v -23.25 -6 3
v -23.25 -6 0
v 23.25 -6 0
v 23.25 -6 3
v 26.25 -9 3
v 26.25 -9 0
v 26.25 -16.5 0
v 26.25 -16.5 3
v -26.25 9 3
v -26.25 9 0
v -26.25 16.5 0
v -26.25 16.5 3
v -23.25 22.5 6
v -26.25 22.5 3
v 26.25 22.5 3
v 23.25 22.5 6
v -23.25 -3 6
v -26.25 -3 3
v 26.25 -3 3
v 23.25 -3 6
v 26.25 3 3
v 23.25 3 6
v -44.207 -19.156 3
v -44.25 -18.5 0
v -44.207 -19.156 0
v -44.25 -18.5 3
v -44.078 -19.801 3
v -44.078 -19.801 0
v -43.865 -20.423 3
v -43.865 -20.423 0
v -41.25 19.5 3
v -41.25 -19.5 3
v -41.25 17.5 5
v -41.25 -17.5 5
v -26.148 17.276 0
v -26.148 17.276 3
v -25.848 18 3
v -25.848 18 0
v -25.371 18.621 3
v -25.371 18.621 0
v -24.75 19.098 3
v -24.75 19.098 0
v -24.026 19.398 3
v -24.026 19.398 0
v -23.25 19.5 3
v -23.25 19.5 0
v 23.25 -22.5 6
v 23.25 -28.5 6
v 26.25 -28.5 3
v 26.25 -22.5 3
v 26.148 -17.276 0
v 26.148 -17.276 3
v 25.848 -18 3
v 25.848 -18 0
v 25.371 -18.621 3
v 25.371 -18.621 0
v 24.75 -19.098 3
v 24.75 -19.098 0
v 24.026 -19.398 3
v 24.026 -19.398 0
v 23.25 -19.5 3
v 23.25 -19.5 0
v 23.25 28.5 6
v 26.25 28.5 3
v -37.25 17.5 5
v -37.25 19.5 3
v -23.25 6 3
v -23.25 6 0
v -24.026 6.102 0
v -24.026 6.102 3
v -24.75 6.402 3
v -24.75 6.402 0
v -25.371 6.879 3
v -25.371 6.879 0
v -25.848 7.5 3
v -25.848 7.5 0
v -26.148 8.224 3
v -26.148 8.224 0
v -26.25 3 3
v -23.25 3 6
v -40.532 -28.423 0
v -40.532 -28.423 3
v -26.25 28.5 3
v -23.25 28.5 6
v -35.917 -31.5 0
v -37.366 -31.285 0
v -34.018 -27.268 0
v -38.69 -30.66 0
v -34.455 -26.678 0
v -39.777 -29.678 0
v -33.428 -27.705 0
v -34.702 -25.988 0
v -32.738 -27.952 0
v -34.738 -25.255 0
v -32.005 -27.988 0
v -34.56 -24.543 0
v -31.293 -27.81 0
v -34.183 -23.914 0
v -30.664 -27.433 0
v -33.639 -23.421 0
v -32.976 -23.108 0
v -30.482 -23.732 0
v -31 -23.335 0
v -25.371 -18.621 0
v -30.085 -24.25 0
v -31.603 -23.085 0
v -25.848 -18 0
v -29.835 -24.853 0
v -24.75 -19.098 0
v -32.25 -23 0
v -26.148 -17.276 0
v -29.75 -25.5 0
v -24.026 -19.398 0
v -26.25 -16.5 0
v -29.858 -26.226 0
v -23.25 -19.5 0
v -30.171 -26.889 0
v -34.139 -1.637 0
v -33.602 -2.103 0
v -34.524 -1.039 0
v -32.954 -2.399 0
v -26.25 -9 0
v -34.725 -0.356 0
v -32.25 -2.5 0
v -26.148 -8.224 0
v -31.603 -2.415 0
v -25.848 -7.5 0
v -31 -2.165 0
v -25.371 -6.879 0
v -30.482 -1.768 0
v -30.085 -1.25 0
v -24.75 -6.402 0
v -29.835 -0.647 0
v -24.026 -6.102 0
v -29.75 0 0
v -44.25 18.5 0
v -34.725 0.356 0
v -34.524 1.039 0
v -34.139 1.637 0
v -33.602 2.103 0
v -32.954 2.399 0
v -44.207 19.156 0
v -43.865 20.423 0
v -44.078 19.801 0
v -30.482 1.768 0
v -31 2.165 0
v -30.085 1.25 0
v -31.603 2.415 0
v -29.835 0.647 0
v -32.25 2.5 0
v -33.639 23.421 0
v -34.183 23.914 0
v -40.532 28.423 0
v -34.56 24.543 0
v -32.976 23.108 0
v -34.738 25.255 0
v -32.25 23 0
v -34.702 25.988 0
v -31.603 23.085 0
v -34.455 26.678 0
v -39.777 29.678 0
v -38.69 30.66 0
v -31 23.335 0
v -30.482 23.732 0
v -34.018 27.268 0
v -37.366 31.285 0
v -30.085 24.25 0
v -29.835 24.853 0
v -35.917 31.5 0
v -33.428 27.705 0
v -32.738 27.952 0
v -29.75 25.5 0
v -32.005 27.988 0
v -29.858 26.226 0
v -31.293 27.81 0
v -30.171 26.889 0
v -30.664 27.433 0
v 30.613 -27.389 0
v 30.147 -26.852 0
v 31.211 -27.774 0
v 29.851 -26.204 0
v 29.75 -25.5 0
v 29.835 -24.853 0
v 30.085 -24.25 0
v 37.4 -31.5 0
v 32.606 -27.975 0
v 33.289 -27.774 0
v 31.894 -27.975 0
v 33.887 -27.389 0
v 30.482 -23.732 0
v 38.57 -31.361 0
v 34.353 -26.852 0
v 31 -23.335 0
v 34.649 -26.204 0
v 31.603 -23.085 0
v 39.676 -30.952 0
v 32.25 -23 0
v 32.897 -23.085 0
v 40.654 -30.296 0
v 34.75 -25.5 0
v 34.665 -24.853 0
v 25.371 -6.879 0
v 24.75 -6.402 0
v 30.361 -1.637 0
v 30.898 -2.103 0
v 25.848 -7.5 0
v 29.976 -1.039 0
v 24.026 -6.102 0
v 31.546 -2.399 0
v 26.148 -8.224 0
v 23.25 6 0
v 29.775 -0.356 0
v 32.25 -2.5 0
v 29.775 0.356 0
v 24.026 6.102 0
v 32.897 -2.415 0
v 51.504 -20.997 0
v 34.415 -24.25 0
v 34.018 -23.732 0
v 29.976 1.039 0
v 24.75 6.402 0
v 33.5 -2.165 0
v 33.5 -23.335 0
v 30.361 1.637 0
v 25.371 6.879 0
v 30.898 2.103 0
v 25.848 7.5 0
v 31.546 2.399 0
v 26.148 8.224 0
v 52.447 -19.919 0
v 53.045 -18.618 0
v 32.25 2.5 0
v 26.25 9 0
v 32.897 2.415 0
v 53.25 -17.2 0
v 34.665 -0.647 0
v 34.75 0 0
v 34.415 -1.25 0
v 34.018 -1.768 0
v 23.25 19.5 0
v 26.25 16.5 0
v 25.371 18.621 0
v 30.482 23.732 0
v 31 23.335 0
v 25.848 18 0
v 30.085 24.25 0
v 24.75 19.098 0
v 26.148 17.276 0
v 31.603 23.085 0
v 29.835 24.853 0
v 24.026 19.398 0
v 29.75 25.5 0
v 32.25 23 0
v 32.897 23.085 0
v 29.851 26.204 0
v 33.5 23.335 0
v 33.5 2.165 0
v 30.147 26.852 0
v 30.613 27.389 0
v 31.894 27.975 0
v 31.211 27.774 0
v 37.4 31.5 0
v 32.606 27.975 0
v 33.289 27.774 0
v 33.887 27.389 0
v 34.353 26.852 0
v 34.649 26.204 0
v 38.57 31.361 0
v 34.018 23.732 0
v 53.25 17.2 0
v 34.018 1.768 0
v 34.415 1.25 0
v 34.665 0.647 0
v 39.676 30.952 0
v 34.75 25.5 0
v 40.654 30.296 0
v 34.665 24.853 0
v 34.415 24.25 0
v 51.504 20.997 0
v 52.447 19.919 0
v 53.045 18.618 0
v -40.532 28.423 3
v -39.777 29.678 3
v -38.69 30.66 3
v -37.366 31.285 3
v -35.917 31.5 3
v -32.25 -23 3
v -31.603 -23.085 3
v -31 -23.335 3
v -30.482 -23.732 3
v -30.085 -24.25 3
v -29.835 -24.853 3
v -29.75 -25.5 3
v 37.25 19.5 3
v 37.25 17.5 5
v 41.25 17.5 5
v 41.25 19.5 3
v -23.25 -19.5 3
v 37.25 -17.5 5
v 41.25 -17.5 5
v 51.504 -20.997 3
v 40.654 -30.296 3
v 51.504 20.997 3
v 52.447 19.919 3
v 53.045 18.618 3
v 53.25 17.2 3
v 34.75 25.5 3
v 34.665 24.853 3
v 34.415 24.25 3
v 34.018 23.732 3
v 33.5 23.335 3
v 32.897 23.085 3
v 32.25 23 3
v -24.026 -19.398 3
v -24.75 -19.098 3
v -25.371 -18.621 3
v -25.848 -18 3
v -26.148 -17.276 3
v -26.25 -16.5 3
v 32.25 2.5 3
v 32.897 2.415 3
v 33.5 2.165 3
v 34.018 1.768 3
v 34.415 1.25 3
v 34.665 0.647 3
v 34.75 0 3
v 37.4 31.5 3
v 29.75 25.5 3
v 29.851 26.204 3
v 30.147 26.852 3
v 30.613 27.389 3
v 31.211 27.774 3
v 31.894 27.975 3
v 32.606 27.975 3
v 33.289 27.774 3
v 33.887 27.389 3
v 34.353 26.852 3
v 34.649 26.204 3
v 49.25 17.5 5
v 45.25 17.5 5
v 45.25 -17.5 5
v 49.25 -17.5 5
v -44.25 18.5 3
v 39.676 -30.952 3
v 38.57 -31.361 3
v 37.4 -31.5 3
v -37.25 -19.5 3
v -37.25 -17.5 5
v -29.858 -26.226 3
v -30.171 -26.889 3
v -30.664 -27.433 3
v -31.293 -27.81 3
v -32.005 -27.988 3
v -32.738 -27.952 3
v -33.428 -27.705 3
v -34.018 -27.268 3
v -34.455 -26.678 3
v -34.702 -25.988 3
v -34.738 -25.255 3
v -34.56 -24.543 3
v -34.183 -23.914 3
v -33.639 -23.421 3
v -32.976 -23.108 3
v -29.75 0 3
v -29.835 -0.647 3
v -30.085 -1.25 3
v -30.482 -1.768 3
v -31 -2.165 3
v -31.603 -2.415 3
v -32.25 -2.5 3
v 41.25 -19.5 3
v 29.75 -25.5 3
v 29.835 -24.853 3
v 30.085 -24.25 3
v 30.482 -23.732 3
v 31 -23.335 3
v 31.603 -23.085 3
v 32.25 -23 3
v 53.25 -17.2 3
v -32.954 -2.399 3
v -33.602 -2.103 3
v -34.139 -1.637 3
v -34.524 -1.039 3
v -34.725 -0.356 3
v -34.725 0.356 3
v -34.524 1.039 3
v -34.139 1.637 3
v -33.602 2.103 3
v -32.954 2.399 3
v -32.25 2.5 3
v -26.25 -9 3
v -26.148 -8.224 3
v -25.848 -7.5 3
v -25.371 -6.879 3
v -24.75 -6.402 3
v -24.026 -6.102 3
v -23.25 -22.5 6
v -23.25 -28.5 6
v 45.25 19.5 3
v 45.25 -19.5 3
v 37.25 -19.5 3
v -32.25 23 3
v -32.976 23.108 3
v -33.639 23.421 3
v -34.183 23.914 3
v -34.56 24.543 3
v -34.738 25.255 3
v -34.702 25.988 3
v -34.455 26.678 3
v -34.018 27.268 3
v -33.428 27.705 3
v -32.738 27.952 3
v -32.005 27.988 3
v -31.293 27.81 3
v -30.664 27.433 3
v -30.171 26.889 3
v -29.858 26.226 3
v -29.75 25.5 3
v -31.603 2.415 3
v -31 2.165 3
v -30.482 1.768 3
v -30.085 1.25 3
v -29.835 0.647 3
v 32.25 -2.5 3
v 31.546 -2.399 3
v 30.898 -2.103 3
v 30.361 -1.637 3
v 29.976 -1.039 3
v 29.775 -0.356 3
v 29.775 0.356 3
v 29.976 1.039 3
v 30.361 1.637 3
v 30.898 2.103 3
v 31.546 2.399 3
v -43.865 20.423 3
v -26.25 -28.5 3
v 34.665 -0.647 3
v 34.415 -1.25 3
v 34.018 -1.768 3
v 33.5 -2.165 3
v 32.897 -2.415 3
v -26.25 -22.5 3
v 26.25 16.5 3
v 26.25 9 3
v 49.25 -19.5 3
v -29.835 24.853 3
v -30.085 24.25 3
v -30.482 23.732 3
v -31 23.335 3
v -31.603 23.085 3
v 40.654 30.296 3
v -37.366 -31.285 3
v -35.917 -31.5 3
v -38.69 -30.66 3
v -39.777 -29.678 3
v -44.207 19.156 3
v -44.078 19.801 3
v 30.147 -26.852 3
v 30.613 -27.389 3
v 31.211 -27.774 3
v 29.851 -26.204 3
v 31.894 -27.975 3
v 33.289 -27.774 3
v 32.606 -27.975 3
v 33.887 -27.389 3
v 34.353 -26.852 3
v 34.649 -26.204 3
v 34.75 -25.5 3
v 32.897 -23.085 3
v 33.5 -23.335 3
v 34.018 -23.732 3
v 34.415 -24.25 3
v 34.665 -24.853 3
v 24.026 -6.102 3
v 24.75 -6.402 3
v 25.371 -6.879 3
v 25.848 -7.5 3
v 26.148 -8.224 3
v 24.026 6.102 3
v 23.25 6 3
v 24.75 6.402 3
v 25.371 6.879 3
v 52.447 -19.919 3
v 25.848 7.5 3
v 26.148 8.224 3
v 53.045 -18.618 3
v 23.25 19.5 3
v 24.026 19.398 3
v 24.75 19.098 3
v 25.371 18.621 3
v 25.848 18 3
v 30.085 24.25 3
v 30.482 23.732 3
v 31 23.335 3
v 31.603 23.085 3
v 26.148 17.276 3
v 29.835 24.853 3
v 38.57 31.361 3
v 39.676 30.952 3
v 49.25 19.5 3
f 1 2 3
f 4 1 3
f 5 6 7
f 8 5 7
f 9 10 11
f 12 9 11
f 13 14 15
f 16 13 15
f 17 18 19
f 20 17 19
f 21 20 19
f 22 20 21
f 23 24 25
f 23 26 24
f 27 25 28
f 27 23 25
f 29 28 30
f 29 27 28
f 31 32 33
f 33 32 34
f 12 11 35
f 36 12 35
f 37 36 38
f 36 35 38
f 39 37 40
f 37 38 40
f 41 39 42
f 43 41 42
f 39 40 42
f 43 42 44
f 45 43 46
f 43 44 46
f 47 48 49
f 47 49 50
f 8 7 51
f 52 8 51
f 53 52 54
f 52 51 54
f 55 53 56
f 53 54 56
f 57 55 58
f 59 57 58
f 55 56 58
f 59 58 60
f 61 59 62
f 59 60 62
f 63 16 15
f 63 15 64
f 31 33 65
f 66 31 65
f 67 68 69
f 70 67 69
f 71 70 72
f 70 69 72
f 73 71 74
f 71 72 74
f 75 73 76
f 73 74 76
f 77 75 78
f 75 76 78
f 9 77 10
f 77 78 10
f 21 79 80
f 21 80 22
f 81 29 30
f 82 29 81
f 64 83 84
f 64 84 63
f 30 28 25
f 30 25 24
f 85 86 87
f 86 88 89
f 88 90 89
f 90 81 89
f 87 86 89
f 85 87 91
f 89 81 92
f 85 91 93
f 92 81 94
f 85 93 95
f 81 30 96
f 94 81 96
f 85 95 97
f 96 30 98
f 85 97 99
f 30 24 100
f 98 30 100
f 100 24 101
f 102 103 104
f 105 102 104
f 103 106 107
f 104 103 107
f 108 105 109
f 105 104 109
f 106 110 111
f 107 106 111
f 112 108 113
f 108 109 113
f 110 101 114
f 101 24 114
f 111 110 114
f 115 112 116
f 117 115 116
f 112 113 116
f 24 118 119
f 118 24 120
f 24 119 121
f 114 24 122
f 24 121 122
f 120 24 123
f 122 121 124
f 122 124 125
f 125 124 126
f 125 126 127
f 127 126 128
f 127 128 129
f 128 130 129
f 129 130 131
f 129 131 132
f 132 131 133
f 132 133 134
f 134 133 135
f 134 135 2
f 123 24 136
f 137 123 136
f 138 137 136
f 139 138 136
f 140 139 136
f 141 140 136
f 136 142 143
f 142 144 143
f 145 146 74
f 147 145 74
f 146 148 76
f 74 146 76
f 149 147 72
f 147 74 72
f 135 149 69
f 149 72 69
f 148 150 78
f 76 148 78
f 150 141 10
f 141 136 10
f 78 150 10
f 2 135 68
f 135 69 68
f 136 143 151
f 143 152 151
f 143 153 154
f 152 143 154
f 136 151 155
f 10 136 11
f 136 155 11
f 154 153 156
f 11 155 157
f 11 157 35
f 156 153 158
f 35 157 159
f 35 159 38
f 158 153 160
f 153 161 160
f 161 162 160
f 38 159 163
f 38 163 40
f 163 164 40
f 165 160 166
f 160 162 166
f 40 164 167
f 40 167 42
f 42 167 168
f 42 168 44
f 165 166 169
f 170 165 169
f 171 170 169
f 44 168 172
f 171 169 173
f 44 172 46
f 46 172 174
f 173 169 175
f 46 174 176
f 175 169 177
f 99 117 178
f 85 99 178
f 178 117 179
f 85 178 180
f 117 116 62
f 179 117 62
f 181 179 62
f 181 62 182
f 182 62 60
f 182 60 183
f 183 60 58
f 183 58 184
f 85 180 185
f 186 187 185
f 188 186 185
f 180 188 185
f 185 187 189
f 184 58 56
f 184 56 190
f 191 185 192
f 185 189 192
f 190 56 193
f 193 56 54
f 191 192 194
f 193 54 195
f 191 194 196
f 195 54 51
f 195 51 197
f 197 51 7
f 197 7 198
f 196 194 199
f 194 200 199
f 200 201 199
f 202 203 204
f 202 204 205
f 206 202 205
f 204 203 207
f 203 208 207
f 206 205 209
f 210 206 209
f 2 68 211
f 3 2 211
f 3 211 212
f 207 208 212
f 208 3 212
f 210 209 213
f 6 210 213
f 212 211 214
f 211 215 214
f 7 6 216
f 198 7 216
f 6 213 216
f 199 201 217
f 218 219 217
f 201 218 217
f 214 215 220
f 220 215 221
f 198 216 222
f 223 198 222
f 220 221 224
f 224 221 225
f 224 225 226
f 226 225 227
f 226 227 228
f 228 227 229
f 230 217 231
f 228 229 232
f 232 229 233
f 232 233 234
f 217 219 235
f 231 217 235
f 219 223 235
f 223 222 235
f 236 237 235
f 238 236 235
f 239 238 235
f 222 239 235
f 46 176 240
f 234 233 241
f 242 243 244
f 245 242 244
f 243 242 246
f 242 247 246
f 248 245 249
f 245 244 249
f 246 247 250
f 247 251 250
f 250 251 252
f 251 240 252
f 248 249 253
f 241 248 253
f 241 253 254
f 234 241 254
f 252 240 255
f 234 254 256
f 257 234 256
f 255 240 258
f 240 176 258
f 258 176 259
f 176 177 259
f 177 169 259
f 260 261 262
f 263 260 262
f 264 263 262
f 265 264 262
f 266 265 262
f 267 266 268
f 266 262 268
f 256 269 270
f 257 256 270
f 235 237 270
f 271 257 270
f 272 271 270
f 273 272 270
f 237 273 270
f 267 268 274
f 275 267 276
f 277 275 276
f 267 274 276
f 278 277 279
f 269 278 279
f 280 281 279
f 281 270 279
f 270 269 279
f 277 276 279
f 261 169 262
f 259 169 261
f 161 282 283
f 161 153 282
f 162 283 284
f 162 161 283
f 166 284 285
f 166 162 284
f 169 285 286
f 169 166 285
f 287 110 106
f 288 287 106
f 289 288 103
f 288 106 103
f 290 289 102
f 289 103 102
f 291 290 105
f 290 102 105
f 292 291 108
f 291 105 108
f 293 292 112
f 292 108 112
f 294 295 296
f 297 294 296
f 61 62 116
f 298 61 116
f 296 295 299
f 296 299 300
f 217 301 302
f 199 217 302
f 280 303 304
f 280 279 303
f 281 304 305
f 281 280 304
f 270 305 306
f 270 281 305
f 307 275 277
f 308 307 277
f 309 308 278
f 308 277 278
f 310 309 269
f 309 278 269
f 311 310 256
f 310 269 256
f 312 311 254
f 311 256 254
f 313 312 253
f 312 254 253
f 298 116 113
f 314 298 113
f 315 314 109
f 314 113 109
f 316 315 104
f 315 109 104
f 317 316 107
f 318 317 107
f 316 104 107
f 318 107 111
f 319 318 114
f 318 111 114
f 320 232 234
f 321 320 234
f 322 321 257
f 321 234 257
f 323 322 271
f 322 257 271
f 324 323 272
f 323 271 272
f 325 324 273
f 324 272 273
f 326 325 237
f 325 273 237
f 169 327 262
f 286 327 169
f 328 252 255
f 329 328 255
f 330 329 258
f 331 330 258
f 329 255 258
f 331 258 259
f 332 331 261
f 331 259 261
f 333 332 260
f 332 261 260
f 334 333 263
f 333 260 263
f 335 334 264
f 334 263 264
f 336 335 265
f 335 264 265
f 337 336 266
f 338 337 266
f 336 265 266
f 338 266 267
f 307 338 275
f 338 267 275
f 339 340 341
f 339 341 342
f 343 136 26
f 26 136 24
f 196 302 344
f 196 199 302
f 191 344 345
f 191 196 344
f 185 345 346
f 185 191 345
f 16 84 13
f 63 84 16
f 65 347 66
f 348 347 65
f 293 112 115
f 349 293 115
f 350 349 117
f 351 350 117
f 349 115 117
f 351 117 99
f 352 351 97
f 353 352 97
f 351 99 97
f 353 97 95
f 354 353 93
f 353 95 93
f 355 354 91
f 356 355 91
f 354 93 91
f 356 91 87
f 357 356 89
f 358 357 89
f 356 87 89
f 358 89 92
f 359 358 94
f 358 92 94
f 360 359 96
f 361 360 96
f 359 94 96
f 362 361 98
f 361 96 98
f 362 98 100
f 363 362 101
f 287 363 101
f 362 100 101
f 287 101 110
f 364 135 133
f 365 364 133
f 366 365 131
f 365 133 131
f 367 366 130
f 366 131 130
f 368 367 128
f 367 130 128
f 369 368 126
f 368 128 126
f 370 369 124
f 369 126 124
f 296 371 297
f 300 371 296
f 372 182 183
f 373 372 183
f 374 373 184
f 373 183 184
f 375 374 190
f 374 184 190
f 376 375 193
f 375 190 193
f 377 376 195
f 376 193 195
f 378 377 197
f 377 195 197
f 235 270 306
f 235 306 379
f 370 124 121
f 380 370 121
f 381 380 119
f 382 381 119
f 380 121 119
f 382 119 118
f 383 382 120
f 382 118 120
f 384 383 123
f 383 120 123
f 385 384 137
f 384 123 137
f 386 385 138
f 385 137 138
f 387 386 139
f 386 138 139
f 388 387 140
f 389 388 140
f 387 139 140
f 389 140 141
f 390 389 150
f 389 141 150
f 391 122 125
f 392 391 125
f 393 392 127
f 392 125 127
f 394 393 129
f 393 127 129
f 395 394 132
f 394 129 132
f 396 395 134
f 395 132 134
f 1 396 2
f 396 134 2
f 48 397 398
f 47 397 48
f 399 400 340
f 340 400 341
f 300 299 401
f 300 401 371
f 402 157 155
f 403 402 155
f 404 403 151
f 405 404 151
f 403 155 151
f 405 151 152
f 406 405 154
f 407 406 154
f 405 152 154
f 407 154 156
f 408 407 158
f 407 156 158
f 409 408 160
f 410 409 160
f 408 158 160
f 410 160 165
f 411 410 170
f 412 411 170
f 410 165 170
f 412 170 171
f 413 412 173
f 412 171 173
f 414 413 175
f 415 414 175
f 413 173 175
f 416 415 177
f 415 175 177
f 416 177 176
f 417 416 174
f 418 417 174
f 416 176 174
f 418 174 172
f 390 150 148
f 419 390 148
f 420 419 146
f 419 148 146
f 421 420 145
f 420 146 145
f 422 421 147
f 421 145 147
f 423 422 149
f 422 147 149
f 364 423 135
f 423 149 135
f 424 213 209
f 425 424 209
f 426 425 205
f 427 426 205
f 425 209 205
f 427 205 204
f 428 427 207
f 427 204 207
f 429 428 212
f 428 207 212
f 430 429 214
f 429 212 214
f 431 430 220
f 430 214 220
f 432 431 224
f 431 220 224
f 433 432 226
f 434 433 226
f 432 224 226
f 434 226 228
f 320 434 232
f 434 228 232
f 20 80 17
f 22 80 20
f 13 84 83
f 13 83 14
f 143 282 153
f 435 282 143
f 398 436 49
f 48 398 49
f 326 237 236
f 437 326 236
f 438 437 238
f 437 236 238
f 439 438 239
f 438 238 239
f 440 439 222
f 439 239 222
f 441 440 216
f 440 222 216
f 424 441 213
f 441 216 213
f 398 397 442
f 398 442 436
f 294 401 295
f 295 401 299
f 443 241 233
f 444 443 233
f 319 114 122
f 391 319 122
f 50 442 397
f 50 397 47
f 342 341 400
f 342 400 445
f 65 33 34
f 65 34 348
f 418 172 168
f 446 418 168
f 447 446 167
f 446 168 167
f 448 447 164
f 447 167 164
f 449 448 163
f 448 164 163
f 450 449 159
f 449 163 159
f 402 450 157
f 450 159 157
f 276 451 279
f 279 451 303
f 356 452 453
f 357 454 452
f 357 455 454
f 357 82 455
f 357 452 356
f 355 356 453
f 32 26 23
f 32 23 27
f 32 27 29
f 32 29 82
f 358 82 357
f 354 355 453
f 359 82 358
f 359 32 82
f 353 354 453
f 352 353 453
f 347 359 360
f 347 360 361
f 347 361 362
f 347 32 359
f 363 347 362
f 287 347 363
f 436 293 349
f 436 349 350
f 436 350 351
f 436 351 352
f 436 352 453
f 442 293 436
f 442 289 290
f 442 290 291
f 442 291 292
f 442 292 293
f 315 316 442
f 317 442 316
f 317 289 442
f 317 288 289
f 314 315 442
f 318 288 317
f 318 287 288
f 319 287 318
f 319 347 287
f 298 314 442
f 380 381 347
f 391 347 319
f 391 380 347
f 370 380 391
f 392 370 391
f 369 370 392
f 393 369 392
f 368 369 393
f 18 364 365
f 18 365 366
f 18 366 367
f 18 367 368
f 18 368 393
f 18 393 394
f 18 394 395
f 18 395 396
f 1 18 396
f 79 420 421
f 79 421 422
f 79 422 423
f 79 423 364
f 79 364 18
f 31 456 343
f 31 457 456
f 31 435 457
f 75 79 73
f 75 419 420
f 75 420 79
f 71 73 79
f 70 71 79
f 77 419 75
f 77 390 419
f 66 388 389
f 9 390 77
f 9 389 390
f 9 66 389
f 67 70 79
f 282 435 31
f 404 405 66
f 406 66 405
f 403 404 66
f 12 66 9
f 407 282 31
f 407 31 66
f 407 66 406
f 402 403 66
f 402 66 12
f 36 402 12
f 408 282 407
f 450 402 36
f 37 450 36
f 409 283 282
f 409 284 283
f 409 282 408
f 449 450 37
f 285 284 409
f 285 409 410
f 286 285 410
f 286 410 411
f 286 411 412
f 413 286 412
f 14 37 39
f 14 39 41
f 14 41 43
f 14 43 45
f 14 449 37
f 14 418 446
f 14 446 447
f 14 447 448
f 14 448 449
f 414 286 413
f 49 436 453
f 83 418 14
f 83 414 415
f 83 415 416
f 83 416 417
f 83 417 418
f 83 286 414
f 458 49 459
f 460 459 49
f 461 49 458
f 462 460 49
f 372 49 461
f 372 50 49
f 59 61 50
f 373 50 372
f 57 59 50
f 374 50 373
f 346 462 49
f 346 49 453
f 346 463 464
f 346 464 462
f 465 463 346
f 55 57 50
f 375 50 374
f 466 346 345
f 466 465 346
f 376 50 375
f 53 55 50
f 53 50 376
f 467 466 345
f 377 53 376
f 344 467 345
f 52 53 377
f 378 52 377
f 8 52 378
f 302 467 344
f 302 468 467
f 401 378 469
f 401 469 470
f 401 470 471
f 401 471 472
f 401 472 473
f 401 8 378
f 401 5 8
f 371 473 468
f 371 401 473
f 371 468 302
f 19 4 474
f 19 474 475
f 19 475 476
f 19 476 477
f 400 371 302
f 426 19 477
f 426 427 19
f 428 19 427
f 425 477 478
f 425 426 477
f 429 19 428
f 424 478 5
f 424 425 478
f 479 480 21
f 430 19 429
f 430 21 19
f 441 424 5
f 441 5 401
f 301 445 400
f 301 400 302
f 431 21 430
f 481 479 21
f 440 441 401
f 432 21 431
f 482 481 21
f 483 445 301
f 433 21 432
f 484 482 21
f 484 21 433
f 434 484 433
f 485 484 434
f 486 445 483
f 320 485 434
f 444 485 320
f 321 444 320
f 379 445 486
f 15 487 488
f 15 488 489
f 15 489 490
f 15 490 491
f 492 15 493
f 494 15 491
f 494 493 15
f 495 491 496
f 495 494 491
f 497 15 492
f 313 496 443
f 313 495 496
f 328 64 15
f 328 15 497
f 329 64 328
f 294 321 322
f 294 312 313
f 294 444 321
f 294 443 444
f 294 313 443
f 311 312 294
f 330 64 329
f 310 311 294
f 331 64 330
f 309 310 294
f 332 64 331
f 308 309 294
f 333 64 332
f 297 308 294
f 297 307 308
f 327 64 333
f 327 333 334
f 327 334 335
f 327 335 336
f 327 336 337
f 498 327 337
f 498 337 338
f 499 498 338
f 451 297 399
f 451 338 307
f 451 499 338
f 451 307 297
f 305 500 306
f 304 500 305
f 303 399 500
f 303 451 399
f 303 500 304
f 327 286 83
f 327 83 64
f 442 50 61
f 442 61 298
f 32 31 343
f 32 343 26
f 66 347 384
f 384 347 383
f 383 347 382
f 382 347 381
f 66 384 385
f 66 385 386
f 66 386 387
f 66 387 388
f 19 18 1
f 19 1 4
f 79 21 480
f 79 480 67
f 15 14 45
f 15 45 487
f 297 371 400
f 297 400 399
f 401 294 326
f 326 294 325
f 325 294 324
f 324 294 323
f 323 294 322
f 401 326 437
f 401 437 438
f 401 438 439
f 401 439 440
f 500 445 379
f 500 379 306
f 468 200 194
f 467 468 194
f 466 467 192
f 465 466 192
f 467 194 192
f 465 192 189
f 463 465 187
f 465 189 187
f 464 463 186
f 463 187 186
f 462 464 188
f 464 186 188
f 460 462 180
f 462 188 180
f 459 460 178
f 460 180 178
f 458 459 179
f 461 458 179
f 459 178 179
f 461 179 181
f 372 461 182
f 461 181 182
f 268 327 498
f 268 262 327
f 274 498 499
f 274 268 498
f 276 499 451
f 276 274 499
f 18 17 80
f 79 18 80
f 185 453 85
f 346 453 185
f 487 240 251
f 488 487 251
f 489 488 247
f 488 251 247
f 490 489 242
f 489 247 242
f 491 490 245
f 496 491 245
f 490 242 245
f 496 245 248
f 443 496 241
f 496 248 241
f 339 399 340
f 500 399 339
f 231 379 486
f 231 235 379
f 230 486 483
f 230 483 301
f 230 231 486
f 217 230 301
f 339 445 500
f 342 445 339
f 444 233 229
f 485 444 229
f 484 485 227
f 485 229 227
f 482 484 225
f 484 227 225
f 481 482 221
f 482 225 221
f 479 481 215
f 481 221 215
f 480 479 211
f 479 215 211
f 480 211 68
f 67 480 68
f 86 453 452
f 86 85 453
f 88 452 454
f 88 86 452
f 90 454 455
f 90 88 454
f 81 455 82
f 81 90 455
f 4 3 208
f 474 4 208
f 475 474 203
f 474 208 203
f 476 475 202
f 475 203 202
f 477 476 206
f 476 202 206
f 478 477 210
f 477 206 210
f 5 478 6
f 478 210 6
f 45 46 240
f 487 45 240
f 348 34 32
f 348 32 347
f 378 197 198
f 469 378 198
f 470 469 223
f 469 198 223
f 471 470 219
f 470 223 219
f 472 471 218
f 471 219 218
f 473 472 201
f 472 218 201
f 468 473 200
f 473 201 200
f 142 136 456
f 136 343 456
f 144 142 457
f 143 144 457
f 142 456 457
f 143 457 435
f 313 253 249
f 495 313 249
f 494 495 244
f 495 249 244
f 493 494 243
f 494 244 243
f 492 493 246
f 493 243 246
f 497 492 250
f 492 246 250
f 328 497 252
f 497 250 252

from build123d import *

# Parameters (mm, degrees)
F0_W       = 52.5
F0_H       = 3
F1_DEPTH   = 6
F0_H_2     = 6
F2_DEPTH   = 3
F4_SIZE    = 2.99999
F5_SIZE2   = 6
F5_SIZE    = 12
F5_2_SIZE2 = 6
F5_2_SIZE  = 12
F6_W       = 4
F6_H       = 39
F7_DEPTH   = 2
F8_SIZE    = 1.99999
F10_DEPTH  = 3
F13_DEPTH  = 3
F12_W      = 4
F12_H      = 39
F15_DEPTH  = 2
F16_SIZE   = 1.99999
F17_SIZE   = 1.99999
F18_DEPTH  = 25
F19_R      = 5


# Not quite as in the source:
# - a fillet or chamfer is up to 0.001 mm smaller than in the source, because OpenCascade refuses the exact size


with BuildPart() as f1:
    # F0 (on Top) → F1 (new body)
    with BuildSketch(Plane.XY):
        with Locations((0, 27)):
            Rectangle(F0_W, F0_H)
        with Locations((0, 24)):
            Rectangle(F0_W, F0_H)
    extrude(amount=F1_DEPTH)


with BuildPart() as f1b:
    # F0 (on Top) → F1, piece 2 (new body)
    with BuildSketch(Plane.XY):
        Rectangle(F0_W, F0_H_2)
    extrude(amount=F1_DEPTH)


with BuildPart() as f1c:
    # F0 (on Top) → F1, piece 3 (new body)
    with BuildSketch(Plane.XY):
        with Locations((0, -24)):
            Rectangle(F0_W, F0_H)
        with Locations((0, -27)):
            Rectangle(F0_W, F0_H)
    extrude(amount=F1_DEPTH)


with BuildPart() as f2:
    # F0 (on Top) → F2 (new body)
    with BuildSketch(Plane.XY):
        Polygon((-38.25, 28.5), (-38.25, -28.5), (-38.25, -31.5), (-35.25, -31.5), (35.25, -31.5), (38.25, -31.5), (38.25, -28.5), (38.25, 28.5), (38.25, 31.5), (35.25, 31.5), (-35.25, 31.5), (-38.25, 31.5), align=None)
        with BuildLine():
            Line((-26.25, -25.5), (-29.75, -25.5))
            ThreePointArc((-29.75, -25.5), (-34.017766953, -27.267766953), (-32.25, -23))
            Line((-32.25, -23), (-32.25, -2.5))
            ThreePointArc((-32.25, -2.5), (-34.75, 0), (-32.25, 2.5))
            Line((-32.25, 2.5), (-32.25, 23))
            ThreePointArc((-32.25, 23), (-34.017766953, 27.267766953), (-29.75, 25.5))
            Line((-29.75, 25.5), (-26.25, 25.5))
            Line((-26.25, 25.5), (-26.25, 28.5))
            Line((-26.25, 28.5), (26.25, 28.5))
            Line((26.25, 28.5), (26.25, 25.5))
            Line((26.25, 25.5), (29.75, 25.5))
            ThreePointArc((29.75, 25.5), (32.25, 28), (34.75, 25.5))
            ThreePointArc((34.75, 25.5), (34.017766953, 23.732233047), (32.25, 23))
            Line((32.25, 23), (32.25, 2.5))
            ThreePointArc((32.25, 2.5), (34.017766953, 1.767766953), (34.75, 0))
            ThreePointArc((34.75, 0), (34.017766953, -1.767766953), (32.25, -2.5))
            Line((32.25, -2.5), (32.25, -23))
            ThreePointArc((32.25, -23), (34.017766953, -23.732233047), (34.75, -25.5))
            ThreePointArc((34.75, -25.5), (32.25, -28), (29.75, -25.5))
            Line((29.75, -25.5), (26.25, -25.5))
            Line((26.25, -25.5), (26.25, -28.5))
            Line((26.25, -28.5), (-26.25, -28.5))
            Line((-26.25, -28.5), (-26.25, -25.5))
        make_face(mode=Mode.SUBTRACT)
        with BuildLine():
            ThreePointArc((-32.25, -23), (-30.482233047, -23.732233047), (-29.75, -25.5))
            Line((-29.75, -25.5), (-26.25, -25.5))
            Line((-26.25, -25.5), (-26.25, -22.5))
            Line((-26.25, -22.5), (26.25, -22.5))
            Line((26.25, -22.5), (26.25, -25.5))
            Line((26.25, -25.5), (29.75, -25.5))
            ThreePointArc((29.75, -25.5), (30.482233047, -23.732233047), (32.25, -23))
            Line((32.25, -23), (32.25, -2.5))
            ThreePointArc((32.25, -2.5), (29.75, 0), (32.25, 2.5))
            Line((32.25, 2.5), (32.25, 23))
            ThreePointArc((32.25, 23), (30.482233047, 23.732233047), (29.75, 25.5))
            Line((29.75, 25.5), (26.25, 25.5))
            Line((26.25, 25.5), (26.25, 22.5))
            Line((26.25, 22.5), (-26.25, 22.5))
            Line((-26.25, 22.5), (-26.25, 25.5))
            Line((-26.25, 25.5), (-29.75, 25.5))
            ThreePointArc((-29.75, 25.5), (-30.482233047, 23.732233047), (-32.25, 23))
            Line((-32.25, 23), (-32.25, 2.5))
            ThreePointArc((-32.25, 2.5), (-30.482233047, 1.767766953), (-29.75, 0))
            ThreePointArc((-29.75, 0), (-30.482233047, -1.767766953), (-32.25, -2.5))
            Line((-32.25, -2.5), (-32.25, -23))
        make_face()
        with BuildLine():
            ThreePointArc((-23.25, -19.5), (-25.3713203436, -18.6213203436), (-26.25, -16.5))
            Line((-26.25, -16.5), (-26.25, -9))
            ThreePointArc((-26.25, -9), (-25.3713203436, -6.8786796564), (-23.25, -6))
            Line((-23.25, -6), (23.25, -6))
            ThreePointArc((23.25, -6), (25.3713203436, -6.8786796564), (26.25, -9))
            Line((26.25, -9), (26.25, -16.5))
            ThreePointArc((26.25, -16.5), (25.3713203436, -18.6213203436), (23.25, -19.5))
            Line((23.25, -19.5), (-23.25, -19.5))
        make_face(mode=Mode.SUBTRACT)
        Rectangle(F0_W, F0_H_2, mode=Mode.SUBTRACT)
        with BuildLine():
            Line((-23.25, 19.5), (23.25, 19.5))
            ThreePointArc((23.25, 19.5), (25.3713203436, 18.6213203436), (26.25, 16.5))
            Line((26.25, 16.5), (26.25, 9))
            ThreePointArc((26.25, 9), (25.3713203436, 6.8786796564), (23.25, 6))
            Line((23.25, 6), (-23.25, 6))
            ThreePointArc((-23.25, 6), (-25.3713203436, 6.8786796564), (-26.25, 9))
            Line((-26.25, 9), (-26.25, 16.5))
            ThreePointArc((-26.25, 16.5), (-25.3713203436, 18.6213203436), (-23.25, 19.5))
        make_face(mode=Mode.SUBTRACT)
        Polygon((-38.25, -31.5), (-38.25, -28.5), (-38.25, 28.5), (-38.25, 31.5), (-41.25, 31.5), (-44.25, 31.5), (-44.25, 28.5), (-44.25, -28.5), (-44.25, -31.5), (-41.25, -31.5), align=None)
        Polygon((38.25, -28.5), (38.25, -31.5), (41.25, -31.5), (44.25, -31.5), (44.25, -28.5), (44.25, 28.5), (44.25, 31.5), (41.25, 31.5), (38.25, 31.5), (38.25, 28.5), align=None)
    extrude(amount=F2_DEPTH)


with BuildPart() as f1c_1:
    add(f1c.part)

    # F3: union F1, F1b, F2
    add(f1.part)
    add(f1b.part)
    add(f2.part)

    # F4 (size 3 in the source; OpenCascade refuses exactly that, so slightly less here)
    f4_edges = [f1c_1.edges().sort_by_distance(p)[0] for p in [
        (26.25, 25.5, 6),
        (26.25, 0, 6),
        (26.25, -25.5, 6),
        (-26.25, 25.5, 6),
        (-26.25, 0, 6),
        (-26.25, -25.5, 6),
    ]]
    chamfer(f4_edges, length=F4_SIZE)

    # F5
    f5_edges = [f1c_1.edges().sort_by_distance(p)[0] for p in [
        (44.25, -31.5, 1.5),
        (44.25, 31.5, 1.5),
    ]]
    f5_side = f1c_1.faces().sort_by_distance((44.25, 0, 1.5))[0]
    chamfer(f5_edges, length=F5_SIZE, length2=F5_SIZE2, reference=f5_side)

    # F5#2
    f5_2_edges = [f1c_1.edges().sort_by_distance(p)[0] for p in [
        (-44.25, -31.5, 1.5),
        (-44.25, 31.5, 1.5),
    ]]
    f5_2_side = f1c_1.faces().sort_by_distance((-44.25, 0, 1.5))[0]
    chamfer(f5_2_edges, length=F5_2_SIZE, length2=F5_2_SIZE2, reference=f5_2_side)

    # F6 (on face) → F7 (join)
    with BuildSketch(Plane.XY.offset(3)):
        with Locations((-39.25, 0)):
            Rectangle(F6_W, F6_H)
        with Locations((39.25, 0)):
            Rectangle(F6_W, F6_H)
    extrude(amount=F7_DEPTH)

    # F8 (size 2 in the source; OpenCascade refuses exactly that, so slightly less here)
    f8_edges = [f1c_1.edges().sort_by_distance(p)[0] for p in [
        (-39.25, -19.5, 5),
        (-39.25, 19.5, 5),
        (39.25, 19.5, 5),
        (39.25, -19.5, 5),
    ]]
    chamfer(f8_edges, length=F8_SIZE)


with BuildPart() as f10:
    # F9 (on face) → F10 (new body)
    with BuildSketch(Plane(origin=(0, 0, 0), x_dir=(1, 0, 0), z_dir=(0, 0, -1))):
        Polygon((53.25, 31.5), (38.25, 31.5), (44.25, 19.5), (44.25, -19.5), (38.25, -31.5), (53.25, -31.5), align=None)
    extrude(amount=-F10_DEPTH)


with BuildPart() as f1c_2:
    add(f1c_1.part)

    # F11: union F10
    add(f10.part)


with BuildPart() as f13:
    # F12 (on face) → F13 (new body)
    with BuildSketch(Plane.XY.offset(3)):
        Polygon((-38.25, -31.5), (-44.25, -19.5), (-39.25, -31.5), align=None)
    extrude(amount=-F13_DEPTH)


with BuildPart() as f13b:
    # F12 (on face) → F13, piece 2 (new body)
    with BuildSketch(Plane.XY.offset(3)):
        Polygon((-38.25, 31.5), (-39.25, 31.5), (-44.25, 19.5), align=None)
    extrude(amount=-F13_DEPTH)


with BuildPart() as f1c_3:
    add(f1c_2.part)

    # F14: union F13b, F13
    add(f13b.part)
    add(f13.part)

    # F12 (on face) → F15 (join)
    with BuildSketch(Plane.XY.offset(3)):
        with Locations((47.25, 0)):
            Rectangle(F12_W, F12_H)
    extrude(amount=F15_DEPTH)

    # F16 (size 2 in the source; OpenCascade refuses exactly that, so slightly less here)
    f16_edges = [f1c_3.edges().sort_by_distance(p)[0] for p in [
        (47.25, -19.5, 5),
    ]]
    chamfer(f16_edges, length=F16_SIZE)

    # F17 (size 2 in the source; OpenCascade refuses exactly that, so slightly less here)
    f17_edges = [f1c_3.edges().sort_by_distance(p)[0] for p in [
        (47.25, 19.5, 5),
    ]]
    chamfer(f17_edges, length=F17_SIZE)

    # F12 (on face) → F18 (cut)
    with BuildSketch(Plane.XY.offset(3)):
        Polygon((53.25, 31.5), (39.25, 31.5), (53.25, 19.5), align=None)
        Polygon((53.25, -19.5), (39.25, -31.5), (53.25, -31.5), align=None)
    extrude(amount=-F18_DEPTH, mode=Mode.SUBTRACT)

    # F19
    f19_edges = [f1c_3.edges().sort_by_distance(p)[0] for p in [
        (39.25, -31.5, 1.5),
        (53.25, -19.5, 1.5),
        (-39.25, -31.5, 1.5),
        (-44.25, -19.5, 1.5),
        (-44.25, 19.5, 1.5),
        (-39.25, 31.5, 1.5),
        (39.25, 31.5, 1.5),
        (53.25, 19.5, 1.5),
    ]]
    fillet(f19_edges, radius=F19_R)


solid = f1c_3.part
